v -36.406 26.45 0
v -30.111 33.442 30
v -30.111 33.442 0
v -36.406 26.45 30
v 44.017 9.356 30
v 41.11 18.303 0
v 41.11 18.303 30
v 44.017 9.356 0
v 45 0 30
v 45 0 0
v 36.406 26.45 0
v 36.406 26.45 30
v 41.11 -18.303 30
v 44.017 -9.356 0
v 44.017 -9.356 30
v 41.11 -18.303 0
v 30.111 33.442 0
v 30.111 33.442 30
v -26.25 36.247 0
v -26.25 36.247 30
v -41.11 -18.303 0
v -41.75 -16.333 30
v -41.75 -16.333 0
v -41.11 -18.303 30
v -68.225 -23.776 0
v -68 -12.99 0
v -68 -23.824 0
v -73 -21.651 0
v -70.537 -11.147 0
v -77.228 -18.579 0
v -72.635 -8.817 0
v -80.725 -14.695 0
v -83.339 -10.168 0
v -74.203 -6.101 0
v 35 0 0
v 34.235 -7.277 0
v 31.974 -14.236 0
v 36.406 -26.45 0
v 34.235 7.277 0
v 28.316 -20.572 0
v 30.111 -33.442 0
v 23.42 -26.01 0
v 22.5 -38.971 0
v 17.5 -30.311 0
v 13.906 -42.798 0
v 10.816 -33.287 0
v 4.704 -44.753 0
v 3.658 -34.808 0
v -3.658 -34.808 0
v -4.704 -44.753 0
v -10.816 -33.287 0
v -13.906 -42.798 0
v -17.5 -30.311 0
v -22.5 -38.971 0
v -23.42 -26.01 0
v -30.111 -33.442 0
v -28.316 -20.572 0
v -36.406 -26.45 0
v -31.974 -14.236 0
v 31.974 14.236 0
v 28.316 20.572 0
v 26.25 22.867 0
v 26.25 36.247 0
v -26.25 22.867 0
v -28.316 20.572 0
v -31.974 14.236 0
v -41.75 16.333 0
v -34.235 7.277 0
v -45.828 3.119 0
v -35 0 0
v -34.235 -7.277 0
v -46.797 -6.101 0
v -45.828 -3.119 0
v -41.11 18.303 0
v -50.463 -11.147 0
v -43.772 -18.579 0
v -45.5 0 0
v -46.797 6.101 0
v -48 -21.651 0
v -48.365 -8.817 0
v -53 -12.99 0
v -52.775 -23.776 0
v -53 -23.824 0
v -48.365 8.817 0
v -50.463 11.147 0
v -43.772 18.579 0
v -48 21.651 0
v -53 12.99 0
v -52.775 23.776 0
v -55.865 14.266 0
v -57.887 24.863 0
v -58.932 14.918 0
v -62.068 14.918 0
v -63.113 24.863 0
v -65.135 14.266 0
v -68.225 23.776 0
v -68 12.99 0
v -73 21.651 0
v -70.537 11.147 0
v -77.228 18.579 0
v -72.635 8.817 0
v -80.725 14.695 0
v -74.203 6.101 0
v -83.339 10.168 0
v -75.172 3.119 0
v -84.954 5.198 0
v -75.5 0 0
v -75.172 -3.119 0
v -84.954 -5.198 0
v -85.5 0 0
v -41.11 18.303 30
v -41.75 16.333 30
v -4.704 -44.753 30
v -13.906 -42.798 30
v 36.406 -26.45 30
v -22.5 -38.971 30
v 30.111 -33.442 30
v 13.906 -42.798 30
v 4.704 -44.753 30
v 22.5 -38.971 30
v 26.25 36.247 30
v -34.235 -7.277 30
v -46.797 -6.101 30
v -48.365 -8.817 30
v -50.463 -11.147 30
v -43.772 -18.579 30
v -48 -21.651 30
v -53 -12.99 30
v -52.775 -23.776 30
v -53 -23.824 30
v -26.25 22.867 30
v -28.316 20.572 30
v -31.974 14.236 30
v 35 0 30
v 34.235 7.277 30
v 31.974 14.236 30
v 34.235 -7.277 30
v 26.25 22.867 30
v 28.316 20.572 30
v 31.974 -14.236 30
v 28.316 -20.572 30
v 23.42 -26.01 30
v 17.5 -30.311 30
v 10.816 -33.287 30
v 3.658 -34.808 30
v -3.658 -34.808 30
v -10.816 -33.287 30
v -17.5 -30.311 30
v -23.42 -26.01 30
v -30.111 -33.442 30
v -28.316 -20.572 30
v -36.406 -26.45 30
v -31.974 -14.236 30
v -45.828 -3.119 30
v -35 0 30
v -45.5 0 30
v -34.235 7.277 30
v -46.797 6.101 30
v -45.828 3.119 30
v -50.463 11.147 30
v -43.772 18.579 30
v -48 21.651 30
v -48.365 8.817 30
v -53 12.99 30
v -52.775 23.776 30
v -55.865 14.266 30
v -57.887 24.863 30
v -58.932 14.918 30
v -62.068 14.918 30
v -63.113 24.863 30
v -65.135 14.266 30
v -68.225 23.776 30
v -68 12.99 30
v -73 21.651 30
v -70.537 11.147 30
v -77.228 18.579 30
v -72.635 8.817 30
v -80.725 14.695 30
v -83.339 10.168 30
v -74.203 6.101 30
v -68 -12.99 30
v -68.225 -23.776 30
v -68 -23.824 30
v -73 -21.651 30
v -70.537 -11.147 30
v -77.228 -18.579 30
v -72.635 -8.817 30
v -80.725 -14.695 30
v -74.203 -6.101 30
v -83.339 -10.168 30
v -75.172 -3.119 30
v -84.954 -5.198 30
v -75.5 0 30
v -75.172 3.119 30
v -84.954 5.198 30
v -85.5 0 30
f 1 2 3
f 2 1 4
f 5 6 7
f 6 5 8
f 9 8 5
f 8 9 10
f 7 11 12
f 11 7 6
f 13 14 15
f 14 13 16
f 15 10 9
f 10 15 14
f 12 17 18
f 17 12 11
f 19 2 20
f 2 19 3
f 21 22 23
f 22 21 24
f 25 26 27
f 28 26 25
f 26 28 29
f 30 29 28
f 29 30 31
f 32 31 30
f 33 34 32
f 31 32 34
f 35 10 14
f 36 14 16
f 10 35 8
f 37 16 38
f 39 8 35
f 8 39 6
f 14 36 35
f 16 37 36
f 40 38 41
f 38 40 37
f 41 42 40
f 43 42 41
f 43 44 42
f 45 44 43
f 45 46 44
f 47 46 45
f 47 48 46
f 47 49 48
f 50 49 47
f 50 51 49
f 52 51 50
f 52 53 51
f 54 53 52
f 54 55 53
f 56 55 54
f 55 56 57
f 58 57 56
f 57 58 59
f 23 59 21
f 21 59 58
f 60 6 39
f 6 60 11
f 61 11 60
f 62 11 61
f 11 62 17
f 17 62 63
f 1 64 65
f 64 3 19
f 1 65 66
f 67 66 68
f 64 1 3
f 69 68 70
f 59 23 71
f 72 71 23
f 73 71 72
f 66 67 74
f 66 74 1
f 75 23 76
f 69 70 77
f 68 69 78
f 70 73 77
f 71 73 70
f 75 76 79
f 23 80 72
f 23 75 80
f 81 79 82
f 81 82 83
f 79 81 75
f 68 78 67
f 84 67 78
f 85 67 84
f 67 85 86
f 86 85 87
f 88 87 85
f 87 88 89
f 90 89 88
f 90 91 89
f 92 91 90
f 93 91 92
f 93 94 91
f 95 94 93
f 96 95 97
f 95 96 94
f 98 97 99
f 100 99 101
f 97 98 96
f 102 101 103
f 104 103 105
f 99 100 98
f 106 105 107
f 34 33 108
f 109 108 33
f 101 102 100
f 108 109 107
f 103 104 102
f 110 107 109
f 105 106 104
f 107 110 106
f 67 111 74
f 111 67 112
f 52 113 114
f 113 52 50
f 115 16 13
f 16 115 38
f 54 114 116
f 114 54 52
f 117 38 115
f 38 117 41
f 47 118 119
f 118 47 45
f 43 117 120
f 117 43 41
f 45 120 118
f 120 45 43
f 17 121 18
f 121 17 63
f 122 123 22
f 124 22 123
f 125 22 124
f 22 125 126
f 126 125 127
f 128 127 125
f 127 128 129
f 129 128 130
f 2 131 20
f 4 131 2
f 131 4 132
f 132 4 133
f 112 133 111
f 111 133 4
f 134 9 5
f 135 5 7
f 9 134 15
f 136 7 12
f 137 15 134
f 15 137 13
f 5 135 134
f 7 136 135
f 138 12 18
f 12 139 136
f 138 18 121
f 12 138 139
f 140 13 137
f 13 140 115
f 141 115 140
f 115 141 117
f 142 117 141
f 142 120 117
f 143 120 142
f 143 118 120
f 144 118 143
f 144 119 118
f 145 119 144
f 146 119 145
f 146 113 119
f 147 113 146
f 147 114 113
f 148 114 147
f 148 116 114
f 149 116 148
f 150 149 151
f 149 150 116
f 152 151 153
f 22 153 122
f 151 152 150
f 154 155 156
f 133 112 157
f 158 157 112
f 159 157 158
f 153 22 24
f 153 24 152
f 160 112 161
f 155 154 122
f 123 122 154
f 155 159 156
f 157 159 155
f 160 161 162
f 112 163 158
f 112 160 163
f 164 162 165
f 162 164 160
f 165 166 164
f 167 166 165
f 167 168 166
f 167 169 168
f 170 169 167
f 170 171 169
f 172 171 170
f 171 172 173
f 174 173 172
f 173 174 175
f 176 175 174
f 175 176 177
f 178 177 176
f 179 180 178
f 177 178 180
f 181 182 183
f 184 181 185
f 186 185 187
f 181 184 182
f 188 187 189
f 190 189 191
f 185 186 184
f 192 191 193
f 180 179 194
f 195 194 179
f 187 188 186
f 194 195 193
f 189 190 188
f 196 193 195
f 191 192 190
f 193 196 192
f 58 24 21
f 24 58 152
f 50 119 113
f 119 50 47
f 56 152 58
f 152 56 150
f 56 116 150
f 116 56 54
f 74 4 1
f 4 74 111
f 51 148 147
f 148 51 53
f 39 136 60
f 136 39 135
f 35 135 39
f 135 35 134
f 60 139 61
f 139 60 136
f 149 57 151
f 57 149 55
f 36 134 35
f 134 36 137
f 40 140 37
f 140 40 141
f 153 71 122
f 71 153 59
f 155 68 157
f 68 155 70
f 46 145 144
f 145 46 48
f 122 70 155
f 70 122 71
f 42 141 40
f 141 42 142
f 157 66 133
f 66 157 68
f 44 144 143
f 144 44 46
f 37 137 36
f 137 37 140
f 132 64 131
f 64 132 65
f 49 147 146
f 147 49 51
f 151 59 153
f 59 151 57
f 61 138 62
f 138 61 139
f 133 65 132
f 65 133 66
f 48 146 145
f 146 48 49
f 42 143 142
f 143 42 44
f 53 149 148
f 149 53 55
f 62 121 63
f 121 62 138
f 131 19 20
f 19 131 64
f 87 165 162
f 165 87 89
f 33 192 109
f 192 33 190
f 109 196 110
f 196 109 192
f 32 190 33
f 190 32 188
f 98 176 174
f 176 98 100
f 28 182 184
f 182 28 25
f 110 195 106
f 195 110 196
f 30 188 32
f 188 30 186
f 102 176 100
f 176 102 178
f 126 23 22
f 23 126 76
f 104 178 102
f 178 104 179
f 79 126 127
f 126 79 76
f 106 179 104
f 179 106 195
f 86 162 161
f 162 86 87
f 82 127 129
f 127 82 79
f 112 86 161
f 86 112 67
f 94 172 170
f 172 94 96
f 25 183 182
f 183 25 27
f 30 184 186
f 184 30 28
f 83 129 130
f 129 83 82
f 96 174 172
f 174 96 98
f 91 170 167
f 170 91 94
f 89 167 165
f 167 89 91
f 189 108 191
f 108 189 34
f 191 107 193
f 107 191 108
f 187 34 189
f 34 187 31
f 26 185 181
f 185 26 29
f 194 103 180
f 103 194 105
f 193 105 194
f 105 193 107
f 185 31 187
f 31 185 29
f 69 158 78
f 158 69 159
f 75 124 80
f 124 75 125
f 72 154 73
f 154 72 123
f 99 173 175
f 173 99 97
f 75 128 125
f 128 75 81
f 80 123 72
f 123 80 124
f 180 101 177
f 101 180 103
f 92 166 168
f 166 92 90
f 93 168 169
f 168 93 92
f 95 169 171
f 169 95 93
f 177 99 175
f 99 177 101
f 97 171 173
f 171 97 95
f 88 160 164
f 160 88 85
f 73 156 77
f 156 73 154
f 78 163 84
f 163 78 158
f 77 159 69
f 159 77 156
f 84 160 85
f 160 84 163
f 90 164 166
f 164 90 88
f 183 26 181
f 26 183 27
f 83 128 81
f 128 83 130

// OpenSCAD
HEIGHT=30;
WALL_WIDTH=10;


module open_circle(radius, cube_width) {
  difference() {
    cylinder(r=radius+WALL_WIDTH, h=HEIGHT);
    translate([0,0, -HEIGHT/2])
    cylinder(r=radius, h=HEIGHT*2);
# translate([0, radius, HEIGHT/2])
    cube([cube_width, radius+WALL_WIDTH, HEIGHT*2], true);
  }
}

POLE_R=35;
CABLE_R=15;

union() {
  open_circle(POLE_R, POLE_R*1.5);
  translate([-(POLE_R+CABLE_R*1.7), 0, 0])
  rotate(180)
    open_circle(CABLE_R, CABLE_R);
}
